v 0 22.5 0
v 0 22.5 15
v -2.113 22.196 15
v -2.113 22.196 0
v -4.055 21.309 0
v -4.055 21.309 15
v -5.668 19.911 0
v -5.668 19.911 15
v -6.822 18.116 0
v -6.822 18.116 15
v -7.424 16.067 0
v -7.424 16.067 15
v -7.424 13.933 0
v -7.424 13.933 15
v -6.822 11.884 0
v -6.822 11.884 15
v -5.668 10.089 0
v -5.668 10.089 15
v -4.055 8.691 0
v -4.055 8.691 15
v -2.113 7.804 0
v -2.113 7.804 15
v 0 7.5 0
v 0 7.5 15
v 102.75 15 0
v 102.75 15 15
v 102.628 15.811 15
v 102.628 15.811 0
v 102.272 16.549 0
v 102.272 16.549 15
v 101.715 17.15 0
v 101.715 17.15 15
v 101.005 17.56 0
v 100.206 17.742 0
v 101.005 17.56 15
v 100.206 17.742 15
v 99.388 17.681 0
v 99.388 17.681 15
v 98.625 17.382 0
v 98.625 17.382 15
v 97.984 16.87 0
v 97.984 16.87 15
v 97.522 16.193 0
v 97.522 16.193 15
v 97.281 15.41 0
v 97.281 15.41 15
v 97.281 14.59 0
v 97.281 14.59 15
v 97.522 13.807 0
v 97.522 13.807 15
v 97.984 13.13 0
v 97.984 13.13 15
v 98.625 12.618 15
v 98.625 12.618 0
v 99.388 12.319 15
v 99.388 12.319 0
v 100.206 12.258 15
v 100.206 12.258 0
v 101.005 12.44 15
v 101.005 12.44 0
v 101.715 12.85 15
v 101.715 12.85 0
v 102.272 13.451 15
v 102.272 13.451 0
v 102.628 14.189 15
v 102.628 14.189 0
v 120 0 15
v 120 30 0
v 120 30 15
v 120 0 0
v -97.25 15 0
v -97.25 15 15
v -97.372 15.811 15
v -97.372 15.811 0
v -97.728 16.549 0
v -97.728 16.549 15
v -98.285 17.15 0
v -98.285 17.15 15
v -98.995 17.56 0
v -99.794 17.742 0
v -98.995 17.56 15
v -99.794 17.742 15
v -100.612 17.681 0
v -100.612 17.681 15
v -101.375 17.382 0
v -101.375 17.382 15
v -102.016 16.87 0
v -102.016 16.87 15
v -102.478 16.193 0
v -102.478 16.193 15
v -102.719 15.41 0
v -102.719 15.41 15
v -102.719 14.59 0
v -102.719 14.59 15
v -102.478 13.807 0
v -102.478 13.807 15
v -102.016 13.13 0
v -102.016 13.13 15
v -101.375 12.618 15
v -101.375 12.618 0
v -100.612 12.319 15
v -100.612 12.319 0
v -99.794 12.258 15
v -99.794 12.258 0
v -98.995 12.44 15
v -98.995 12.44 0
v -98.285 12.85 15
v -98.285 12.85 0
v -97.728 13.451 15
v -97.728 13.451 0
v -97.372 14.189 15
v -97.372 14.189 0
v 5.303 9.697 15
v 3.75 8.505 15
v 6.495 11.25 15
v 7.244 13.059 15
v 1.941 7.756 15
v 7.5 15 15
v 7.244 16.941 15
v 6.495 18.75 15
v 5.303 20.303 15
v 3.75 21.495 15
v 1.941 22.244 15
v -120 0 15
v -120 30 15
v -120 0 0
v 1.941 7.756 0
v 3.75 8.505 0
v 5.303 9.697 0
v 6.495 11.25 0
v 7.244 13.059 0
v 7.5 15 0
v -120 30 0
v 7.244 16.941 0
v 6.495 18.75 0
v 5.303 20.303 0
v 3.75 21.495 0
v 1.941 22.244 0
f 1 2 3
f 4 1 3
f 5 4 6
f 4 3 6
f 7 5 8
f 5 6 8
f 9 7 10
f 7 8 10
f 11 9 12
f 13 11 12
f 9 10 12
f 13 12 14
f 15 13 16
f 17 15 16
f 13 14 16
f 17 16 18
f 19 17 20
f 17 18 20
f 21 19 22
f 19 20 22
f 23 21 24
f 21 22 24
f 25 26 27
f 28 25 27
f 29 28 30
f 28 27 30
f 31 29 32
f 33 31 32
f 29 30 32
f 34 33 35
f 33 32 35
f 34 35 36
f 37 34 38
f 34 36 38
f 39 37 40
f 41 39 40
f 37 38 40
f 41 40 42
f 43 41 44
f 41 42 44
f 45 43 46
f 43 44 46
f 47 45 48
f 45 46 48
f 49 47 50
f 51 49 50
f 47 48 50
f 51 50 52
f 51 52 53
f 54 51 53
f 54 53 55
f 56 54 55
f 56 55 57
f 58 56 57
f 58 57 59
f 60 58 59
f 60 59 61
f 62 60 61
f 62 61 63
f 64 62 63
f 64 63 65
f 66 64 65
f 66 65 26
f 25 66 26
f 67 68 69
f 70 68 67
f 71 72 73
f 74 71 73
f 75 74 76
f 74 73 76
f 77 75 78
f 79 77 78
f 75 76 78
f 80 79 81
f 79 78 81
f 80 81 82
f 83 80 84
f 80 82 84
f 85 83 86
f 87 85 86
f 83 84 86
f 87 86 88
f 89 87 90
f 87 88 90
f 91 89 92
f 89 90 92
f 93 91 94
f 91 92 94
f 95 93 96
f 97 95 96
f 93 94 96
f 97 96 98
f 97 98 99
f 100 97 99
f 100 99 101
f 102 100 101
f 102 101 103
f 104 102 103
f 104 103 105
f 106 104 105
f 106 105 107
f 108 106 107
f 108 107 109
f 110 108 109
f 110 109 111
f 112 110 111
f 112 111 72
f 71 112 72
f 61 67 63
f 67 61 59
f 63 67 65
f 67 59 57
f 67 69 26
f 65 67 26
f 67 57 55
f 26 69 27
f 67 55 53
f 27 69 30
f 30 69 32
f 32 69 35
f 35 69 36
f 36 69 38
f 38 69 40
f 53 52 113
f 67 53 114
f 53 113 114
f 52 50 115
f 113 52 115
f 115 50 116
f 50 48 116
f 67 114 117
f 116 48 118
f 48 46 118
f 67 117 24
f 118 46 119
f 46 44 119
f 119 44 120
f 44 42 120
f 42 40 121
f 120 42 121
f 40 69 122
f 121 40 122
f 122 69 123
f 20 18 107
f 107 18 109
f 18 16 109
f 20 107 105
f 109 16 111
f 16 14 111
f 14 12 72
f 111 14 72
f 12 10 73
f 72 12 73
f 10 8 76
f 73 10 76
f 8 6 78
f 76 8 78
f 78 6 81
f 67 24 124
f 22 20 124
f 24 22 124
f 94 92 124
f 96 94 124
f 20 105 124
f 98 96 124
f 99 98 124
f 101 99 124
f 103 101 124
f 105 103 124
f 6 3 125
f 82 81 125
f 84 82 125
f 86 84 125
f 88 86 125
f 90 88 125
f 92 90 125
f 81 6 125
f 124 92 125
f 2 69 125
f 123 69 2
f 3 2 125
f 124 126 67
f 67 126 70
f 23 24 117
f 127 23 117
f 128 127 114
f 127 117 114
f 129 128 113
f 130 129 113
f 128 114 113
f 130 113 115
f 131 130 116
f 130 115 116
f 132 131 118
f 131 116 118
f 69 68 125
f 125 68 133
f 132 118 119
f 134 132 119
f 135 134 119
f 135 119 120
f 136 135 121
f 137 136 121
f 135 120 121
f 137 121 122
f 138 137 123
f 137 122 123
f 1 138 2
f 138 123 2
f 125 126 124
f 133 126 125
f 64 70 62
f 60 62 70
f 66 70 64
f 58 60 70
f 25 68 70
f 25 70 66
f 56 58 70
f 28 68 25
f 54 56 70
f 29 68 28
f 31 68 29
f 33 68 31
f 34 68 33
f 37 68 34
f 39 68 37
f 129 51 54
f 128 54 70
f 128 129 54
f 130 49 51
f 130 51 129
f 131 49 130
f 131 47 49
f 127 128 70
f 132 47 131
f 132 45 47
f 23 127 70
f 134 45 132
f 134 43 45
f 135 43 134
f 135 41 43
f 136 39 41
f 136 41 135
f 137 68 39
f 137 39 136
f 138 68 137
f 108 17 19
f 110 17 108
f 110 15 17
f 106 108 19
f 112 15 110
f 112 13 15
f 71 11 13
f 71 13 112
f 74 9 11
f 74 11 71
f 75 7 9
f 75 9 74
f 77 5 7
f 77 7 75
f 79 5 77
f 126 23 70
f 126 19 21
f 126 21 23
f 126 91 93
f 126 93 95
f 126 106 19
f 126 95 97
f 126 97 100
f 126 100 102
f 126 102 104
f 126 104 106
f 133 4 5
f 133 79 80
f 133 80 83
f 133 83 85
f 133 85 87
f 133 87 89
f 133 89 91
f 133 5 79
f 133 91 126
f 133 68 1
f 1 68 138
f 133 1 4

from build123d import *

# Parameters (mm, degrees)
RESSALTO_EXTRUS_O1_DEPTH = 15
CORTE_EXTRUS_O1_DEPTH    = 15
ESBO_O3_R                = 2.75
CORTE_EXTRUS_O2_DEPTH    = 50


with BuildPart() as part:
    # Esboço1 → Ressalto-extrusão1 (new body)
    with BuildSketch(Plane.XY):
        Polygon((100, 0), (-100, 0), (-120, 0), (-120, 30), (-100, 30), (100, 30), (120, 30), (120, 0), align=None)
    extrude(amount=RESSALTO_EXTRUS_O1_DEPTH)

    # Esboço2 → Corte-extrusão1 (cut)
    with BuildSketch(Plane.XY.offset(15)):
        with BuildLine():
            ThreePointArc((7.5, 15), (5.303300859, 20.303300859), (0, 22.5))
            Line((0, 22.5), (0, 7.5))
            ThreePointArc((0, 7.5), (5.303300859, 9.696699141), (7.5, 15))
        make_face()
        with BuildLine():
            Line((0, 7.5), (0, 22.5))
            ThreePointArc((0, 22.5), (-7.5, 15), (0, 7.5))
        make_face()
    extrude(amount=-CORTE_EXTRUS_O1_DEPTH, mode=Mode.SUBTRACT)

    # Esboço3 → Corte-extrusão2 (cut)
    with BuildSketch(Plane.XY.offset(15)):
        with Locations((-100, 15)):
            Circle(ESBO_O3_R)
        with Locations((100, 15)):
            Circle(ESBO_O3_R)
    extrude(amount=-CORTE_EXTRUS_O2_DEPTH, mode=Mode.SUBTRACT)


solid = part.part
